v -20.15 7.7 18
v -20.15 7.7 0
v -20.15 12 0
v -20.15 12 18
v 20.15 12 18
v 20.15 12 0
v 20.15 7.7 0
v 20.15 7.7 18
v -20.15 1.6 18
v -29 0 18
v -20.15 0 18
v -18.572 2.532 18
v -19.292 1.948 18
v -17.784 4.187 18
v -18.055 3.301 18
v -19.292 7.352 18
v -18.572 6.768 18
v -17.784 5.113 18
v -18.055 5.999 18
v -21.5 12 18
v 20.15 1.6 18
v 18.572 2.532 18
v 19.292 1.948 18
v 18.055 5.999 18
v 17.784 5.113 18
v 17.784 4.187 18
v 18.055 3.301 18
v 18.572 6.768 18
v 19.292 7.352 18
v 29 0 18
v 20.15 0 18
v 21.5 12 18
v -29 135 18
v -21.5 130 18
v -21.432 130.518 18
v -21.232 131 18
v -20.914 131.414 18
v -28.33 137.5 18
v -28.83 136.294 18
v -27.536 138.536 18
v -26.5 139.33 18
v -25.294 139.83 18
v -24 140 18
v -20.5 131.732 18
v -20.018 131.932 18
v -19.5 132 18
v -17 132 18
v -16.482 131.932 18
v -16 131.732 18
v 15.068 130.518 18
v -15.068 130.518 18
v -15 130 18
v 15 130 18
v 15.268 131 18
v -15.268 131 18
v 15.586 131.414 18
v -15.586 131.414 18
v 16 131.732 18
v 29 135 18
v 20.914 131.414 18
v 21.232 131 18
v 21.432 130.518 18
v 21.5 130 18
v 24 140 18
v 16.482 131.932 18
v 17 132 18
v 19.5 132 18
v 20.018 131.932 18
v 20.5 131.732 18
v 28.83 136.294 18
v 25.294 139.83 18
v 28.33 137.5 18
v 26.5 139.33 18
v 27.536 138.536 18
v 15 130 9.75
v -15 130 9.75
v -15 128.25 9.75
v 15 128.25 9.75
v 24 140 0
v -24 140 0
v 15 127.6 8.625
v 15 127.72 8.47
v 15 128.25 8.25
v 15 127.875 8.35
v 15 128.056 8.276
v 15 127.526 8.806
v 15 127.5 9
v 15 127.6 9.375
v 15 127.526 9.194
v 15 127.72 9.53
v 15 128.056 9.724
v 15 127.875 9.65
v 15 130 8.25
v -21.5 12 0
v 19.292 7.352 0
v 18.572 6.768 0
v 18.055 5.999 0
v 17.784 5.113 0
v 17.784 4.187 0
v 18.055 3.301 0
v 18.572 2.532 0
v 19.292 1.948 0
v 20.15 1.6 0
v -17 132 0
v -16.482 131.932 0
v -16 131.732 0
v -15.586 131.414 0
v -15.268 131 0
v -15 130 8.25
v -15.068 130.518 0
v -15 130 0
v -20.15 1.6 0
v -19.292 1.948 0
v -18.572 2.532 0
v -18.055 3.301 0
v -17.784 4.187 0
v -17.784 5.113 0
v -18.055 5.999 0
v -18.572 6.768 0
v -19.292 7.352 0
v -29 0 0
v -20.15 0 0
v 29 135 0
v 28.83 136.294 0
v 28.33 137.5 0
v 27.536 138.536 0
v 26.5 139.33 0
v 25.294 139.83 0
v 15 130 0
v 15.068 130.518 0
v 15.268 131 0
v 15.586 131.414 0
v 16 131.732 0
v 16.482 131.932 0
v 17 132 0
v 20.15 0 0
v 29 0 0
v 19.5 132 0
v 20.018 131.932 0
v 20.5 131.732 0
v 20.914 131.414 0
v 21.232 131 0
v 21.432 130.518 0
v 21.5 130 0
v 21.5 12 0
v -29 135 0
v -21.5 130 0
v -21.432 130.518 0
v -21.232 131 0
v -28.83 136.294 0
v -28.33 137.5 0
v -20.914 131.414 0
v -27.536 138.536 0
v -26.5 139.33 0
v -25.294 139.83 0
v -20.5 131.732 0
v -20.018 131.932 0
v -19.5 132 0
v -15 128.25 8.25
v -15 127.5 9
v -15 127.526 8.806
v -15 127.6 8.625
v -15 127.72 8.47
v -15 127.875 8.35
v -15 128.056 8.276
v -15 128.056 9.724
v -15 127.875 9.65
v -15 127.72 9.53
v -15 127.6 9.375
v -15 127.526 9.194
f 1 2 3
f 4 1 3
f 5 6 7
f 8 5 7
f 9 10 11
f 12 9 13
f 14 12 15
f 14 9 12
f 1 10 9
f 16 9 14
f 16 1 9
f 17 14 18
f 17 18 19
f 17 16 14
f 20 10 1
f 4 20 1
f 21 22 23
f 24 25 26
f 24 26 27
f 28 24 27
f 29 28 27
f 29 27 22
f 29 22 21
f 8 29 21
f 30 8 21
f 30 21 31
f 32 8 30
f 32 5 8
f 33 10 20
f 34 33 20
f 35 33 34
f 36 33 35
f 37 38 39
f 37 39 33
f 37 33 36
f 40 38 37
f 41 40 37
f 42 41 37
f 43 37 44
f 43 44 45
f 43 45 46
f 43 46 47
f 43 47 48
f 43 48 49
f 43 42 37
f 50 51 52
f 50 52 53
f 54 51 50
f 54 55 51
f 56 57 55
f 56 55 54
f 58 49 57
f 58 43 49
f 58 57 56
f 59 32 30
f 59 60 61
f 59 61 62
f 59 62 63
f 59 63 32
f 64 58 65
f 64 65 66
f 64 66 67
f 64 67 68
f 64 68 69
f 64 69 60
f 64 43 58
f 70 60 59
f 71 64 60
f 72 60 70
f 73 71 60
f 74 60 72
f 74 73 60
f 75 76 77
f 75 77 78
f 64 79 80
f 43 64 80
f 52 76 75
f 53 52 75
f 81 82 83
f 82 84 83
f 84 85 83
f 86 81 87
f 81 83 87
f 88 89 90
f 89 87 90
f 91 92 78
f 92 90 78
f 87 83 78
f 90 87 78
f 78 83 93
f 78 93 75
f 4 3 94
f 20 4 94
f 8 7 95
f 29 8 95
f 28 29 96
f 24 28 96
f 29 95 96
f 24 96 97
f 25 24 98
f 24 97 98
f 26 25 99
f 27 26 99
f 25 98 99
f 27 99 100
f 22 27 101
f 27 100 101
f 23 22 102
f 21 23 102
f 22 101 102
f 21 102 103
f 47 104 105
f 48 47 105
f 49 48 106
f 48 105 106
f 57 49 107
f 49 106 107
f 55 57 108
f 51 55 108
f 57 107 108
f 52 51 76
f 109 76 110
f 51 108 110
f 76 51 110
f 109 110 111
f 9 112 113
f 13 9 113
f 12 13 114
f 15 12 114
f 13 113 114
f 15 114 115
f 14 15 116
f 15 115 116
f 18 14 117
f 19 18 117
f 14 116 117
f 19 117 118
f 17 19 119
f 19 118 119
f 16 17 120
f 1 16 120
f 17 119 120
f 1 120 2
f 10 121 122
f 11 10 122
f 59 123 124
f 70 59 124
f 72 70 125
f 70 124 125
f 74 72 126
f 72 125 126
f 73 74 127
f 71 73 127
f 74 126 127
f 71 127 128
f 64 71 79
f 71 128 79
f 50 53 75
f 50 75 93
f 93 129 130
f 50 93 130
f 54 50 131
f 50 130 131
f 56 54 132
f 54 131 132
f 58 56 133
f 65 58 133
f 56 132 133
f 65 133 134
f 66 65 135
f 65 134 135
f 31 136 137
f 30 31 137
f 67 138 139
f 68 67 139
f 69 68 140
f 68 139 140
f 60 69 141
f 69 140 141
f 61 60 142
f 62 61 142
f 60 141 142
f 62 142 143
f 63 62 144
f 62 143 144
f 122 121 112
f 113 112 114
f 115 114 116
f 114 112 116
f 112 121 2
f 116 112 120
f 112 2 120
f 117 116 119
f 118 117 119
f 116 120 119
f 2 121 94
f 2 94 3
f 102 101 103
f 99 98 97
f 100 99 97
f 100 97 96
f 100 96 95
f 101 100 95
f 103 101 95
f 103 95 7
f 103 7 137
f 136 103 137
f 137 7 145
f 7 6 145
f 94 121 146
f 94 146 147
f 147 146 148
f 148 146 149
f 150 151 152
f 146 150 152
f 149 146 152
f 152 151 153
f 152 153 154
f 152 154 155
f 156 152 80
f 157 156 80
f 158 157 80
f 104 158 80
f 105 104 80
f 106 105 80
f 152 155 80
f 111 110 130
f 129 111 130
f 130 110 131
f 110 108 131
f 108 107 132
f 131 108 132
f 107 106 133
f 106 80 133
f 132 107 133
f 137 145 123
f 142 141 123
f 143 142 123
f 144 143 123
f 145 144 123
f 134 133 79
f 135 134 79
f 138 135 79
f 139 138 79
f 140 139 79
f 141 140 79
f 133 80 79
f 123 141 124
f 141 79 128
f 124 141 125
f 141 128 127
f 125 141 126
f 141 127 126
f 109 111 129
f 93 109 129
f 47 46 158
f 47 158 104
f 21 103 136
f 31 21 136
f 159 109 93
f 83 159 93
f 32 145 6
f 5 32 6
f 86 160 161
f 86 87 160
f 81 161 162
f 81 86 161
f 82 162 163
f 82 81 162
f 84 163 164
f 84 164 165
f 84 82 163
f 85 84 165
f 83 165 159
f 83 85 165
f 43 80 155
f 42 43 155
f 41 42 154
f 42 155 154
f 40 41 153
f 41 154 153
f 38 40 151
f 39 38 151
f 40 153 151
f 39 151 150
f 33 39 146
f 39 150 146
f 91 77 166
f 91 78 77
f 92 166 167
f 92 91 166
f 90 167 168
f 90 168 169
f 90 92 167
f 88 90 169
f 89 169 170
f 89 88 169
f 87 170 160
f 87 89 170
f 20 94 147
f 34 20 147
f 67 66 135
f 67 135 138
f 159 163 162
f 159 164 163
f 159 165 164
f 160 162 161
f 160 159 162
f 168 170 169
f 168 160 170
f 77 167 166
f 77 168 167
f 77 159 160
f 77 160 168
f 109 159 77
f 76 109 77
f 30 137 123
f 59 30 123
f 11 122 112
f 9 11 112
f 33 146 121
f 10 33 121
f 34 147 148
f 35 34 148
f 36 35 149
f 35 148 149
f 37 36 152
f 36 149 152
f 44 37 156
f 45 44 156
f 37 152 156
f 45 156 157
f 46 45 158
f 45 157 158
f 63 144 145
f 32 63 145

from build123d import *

# Parameters (mm, degrees)
F2_DEPTH = 18
F3_W     = 30
F3_H     = 1.5
F4_DEPTH = 2.5
F5_R     = 0.75
F6_R     = 0.74999


# Not quite as in the source:
# - a fillet or chamfer is up to 0.001 mm smaller than in the source, because OpenCascade refuses the exact size


with BuildPart() as f2:
    # F1 (on Top) → F2 (new body)
    with BuildSketch(Plane.XY):
        with BuildLine():
            Line((24, 140), (0, 140))
            Line((0, 140), (-24, 140))
            ThreePointArc((-24, 140), (-27.5355339059, 138.5355339059), (-29, 135))
            Line((-29, 135), (-29, 0))
            Line((-29, 0), (-20.15, 0))
            Line((-20.15, 0), (-20.15, 1.6))
            ThreePointArc((-20.15, 1.6), (-17.75, 4.65), (-20.15, 7.7))
            Line((-20.15, 7.7), (-20.15, 12))
            Line((-20.15, 12), (-21.5, 12))
            Line((-21.5, 12), (-21.5, 130))
            ThreePointArc((-21.5, 130), (-20.9142135624, 131.4142135624), (-19.5, 132))
            Line((-19.5, 132), (-17, 132))
            ThreePointArc((-17, 132), (-15.5857864376, 131.4142135624), (-15, 130))
            Line((-15, 130), (0, 130))
            Line((0, 130), (15, 130))
            ThreePointArc((15, 130), (15.5857864376, 131.4142135624), (17, 132))
            Line((17, 132), (19.5, 132))
            ThreePointArc((19.5, 132), (20.9142135624, 131.4142135624), (21.5, 130))
            Line((21.5, 130), (21.5, 12))
            Line((21.5, 12), (20.15, 12))
            Line((20.15, 12), (20.15, 7.7))
            ThreePointArc((20.15, 7.7), (17.75, 4.65), (20.15, 1.6))
            Line((20.15, 1.6), (20.15, 0))
            Line((20.15, 0), (29, 0))
            Line((29, 0), (29, 135))
            ThreePointArc((29, 135), (27.5355339059, 138.5355339059), (24, 140))
        make_face()
    extrude(amount=F2_DEPTH)

    # F3 (on face) → F4 (join)
    with BuildSketch(Plane.XZ.offset(-130)):
        with Locations((0, 9)):
            Rectangle(F3_W, F3_H)
    extrude(amount=F4_DEPTH)

    # F5
    f5_edges = [f2.edges().sort_by_distance(p)[0] for p in [
        (0, 127.5, 9.75),
    ]]
    fillet(f5_edges, radius=F5_R)

    # F6 (radius 0.75 in the source; OpenCascade refuses exactly that, so slightly less here)
    f6_edges = [f2.edges().sort_by_distance(p)[0] for p in [
        (0, 127.5, 8.25),
    ]]
    fillet(f6_edges, radius=F6_R)


solid = f2.part
